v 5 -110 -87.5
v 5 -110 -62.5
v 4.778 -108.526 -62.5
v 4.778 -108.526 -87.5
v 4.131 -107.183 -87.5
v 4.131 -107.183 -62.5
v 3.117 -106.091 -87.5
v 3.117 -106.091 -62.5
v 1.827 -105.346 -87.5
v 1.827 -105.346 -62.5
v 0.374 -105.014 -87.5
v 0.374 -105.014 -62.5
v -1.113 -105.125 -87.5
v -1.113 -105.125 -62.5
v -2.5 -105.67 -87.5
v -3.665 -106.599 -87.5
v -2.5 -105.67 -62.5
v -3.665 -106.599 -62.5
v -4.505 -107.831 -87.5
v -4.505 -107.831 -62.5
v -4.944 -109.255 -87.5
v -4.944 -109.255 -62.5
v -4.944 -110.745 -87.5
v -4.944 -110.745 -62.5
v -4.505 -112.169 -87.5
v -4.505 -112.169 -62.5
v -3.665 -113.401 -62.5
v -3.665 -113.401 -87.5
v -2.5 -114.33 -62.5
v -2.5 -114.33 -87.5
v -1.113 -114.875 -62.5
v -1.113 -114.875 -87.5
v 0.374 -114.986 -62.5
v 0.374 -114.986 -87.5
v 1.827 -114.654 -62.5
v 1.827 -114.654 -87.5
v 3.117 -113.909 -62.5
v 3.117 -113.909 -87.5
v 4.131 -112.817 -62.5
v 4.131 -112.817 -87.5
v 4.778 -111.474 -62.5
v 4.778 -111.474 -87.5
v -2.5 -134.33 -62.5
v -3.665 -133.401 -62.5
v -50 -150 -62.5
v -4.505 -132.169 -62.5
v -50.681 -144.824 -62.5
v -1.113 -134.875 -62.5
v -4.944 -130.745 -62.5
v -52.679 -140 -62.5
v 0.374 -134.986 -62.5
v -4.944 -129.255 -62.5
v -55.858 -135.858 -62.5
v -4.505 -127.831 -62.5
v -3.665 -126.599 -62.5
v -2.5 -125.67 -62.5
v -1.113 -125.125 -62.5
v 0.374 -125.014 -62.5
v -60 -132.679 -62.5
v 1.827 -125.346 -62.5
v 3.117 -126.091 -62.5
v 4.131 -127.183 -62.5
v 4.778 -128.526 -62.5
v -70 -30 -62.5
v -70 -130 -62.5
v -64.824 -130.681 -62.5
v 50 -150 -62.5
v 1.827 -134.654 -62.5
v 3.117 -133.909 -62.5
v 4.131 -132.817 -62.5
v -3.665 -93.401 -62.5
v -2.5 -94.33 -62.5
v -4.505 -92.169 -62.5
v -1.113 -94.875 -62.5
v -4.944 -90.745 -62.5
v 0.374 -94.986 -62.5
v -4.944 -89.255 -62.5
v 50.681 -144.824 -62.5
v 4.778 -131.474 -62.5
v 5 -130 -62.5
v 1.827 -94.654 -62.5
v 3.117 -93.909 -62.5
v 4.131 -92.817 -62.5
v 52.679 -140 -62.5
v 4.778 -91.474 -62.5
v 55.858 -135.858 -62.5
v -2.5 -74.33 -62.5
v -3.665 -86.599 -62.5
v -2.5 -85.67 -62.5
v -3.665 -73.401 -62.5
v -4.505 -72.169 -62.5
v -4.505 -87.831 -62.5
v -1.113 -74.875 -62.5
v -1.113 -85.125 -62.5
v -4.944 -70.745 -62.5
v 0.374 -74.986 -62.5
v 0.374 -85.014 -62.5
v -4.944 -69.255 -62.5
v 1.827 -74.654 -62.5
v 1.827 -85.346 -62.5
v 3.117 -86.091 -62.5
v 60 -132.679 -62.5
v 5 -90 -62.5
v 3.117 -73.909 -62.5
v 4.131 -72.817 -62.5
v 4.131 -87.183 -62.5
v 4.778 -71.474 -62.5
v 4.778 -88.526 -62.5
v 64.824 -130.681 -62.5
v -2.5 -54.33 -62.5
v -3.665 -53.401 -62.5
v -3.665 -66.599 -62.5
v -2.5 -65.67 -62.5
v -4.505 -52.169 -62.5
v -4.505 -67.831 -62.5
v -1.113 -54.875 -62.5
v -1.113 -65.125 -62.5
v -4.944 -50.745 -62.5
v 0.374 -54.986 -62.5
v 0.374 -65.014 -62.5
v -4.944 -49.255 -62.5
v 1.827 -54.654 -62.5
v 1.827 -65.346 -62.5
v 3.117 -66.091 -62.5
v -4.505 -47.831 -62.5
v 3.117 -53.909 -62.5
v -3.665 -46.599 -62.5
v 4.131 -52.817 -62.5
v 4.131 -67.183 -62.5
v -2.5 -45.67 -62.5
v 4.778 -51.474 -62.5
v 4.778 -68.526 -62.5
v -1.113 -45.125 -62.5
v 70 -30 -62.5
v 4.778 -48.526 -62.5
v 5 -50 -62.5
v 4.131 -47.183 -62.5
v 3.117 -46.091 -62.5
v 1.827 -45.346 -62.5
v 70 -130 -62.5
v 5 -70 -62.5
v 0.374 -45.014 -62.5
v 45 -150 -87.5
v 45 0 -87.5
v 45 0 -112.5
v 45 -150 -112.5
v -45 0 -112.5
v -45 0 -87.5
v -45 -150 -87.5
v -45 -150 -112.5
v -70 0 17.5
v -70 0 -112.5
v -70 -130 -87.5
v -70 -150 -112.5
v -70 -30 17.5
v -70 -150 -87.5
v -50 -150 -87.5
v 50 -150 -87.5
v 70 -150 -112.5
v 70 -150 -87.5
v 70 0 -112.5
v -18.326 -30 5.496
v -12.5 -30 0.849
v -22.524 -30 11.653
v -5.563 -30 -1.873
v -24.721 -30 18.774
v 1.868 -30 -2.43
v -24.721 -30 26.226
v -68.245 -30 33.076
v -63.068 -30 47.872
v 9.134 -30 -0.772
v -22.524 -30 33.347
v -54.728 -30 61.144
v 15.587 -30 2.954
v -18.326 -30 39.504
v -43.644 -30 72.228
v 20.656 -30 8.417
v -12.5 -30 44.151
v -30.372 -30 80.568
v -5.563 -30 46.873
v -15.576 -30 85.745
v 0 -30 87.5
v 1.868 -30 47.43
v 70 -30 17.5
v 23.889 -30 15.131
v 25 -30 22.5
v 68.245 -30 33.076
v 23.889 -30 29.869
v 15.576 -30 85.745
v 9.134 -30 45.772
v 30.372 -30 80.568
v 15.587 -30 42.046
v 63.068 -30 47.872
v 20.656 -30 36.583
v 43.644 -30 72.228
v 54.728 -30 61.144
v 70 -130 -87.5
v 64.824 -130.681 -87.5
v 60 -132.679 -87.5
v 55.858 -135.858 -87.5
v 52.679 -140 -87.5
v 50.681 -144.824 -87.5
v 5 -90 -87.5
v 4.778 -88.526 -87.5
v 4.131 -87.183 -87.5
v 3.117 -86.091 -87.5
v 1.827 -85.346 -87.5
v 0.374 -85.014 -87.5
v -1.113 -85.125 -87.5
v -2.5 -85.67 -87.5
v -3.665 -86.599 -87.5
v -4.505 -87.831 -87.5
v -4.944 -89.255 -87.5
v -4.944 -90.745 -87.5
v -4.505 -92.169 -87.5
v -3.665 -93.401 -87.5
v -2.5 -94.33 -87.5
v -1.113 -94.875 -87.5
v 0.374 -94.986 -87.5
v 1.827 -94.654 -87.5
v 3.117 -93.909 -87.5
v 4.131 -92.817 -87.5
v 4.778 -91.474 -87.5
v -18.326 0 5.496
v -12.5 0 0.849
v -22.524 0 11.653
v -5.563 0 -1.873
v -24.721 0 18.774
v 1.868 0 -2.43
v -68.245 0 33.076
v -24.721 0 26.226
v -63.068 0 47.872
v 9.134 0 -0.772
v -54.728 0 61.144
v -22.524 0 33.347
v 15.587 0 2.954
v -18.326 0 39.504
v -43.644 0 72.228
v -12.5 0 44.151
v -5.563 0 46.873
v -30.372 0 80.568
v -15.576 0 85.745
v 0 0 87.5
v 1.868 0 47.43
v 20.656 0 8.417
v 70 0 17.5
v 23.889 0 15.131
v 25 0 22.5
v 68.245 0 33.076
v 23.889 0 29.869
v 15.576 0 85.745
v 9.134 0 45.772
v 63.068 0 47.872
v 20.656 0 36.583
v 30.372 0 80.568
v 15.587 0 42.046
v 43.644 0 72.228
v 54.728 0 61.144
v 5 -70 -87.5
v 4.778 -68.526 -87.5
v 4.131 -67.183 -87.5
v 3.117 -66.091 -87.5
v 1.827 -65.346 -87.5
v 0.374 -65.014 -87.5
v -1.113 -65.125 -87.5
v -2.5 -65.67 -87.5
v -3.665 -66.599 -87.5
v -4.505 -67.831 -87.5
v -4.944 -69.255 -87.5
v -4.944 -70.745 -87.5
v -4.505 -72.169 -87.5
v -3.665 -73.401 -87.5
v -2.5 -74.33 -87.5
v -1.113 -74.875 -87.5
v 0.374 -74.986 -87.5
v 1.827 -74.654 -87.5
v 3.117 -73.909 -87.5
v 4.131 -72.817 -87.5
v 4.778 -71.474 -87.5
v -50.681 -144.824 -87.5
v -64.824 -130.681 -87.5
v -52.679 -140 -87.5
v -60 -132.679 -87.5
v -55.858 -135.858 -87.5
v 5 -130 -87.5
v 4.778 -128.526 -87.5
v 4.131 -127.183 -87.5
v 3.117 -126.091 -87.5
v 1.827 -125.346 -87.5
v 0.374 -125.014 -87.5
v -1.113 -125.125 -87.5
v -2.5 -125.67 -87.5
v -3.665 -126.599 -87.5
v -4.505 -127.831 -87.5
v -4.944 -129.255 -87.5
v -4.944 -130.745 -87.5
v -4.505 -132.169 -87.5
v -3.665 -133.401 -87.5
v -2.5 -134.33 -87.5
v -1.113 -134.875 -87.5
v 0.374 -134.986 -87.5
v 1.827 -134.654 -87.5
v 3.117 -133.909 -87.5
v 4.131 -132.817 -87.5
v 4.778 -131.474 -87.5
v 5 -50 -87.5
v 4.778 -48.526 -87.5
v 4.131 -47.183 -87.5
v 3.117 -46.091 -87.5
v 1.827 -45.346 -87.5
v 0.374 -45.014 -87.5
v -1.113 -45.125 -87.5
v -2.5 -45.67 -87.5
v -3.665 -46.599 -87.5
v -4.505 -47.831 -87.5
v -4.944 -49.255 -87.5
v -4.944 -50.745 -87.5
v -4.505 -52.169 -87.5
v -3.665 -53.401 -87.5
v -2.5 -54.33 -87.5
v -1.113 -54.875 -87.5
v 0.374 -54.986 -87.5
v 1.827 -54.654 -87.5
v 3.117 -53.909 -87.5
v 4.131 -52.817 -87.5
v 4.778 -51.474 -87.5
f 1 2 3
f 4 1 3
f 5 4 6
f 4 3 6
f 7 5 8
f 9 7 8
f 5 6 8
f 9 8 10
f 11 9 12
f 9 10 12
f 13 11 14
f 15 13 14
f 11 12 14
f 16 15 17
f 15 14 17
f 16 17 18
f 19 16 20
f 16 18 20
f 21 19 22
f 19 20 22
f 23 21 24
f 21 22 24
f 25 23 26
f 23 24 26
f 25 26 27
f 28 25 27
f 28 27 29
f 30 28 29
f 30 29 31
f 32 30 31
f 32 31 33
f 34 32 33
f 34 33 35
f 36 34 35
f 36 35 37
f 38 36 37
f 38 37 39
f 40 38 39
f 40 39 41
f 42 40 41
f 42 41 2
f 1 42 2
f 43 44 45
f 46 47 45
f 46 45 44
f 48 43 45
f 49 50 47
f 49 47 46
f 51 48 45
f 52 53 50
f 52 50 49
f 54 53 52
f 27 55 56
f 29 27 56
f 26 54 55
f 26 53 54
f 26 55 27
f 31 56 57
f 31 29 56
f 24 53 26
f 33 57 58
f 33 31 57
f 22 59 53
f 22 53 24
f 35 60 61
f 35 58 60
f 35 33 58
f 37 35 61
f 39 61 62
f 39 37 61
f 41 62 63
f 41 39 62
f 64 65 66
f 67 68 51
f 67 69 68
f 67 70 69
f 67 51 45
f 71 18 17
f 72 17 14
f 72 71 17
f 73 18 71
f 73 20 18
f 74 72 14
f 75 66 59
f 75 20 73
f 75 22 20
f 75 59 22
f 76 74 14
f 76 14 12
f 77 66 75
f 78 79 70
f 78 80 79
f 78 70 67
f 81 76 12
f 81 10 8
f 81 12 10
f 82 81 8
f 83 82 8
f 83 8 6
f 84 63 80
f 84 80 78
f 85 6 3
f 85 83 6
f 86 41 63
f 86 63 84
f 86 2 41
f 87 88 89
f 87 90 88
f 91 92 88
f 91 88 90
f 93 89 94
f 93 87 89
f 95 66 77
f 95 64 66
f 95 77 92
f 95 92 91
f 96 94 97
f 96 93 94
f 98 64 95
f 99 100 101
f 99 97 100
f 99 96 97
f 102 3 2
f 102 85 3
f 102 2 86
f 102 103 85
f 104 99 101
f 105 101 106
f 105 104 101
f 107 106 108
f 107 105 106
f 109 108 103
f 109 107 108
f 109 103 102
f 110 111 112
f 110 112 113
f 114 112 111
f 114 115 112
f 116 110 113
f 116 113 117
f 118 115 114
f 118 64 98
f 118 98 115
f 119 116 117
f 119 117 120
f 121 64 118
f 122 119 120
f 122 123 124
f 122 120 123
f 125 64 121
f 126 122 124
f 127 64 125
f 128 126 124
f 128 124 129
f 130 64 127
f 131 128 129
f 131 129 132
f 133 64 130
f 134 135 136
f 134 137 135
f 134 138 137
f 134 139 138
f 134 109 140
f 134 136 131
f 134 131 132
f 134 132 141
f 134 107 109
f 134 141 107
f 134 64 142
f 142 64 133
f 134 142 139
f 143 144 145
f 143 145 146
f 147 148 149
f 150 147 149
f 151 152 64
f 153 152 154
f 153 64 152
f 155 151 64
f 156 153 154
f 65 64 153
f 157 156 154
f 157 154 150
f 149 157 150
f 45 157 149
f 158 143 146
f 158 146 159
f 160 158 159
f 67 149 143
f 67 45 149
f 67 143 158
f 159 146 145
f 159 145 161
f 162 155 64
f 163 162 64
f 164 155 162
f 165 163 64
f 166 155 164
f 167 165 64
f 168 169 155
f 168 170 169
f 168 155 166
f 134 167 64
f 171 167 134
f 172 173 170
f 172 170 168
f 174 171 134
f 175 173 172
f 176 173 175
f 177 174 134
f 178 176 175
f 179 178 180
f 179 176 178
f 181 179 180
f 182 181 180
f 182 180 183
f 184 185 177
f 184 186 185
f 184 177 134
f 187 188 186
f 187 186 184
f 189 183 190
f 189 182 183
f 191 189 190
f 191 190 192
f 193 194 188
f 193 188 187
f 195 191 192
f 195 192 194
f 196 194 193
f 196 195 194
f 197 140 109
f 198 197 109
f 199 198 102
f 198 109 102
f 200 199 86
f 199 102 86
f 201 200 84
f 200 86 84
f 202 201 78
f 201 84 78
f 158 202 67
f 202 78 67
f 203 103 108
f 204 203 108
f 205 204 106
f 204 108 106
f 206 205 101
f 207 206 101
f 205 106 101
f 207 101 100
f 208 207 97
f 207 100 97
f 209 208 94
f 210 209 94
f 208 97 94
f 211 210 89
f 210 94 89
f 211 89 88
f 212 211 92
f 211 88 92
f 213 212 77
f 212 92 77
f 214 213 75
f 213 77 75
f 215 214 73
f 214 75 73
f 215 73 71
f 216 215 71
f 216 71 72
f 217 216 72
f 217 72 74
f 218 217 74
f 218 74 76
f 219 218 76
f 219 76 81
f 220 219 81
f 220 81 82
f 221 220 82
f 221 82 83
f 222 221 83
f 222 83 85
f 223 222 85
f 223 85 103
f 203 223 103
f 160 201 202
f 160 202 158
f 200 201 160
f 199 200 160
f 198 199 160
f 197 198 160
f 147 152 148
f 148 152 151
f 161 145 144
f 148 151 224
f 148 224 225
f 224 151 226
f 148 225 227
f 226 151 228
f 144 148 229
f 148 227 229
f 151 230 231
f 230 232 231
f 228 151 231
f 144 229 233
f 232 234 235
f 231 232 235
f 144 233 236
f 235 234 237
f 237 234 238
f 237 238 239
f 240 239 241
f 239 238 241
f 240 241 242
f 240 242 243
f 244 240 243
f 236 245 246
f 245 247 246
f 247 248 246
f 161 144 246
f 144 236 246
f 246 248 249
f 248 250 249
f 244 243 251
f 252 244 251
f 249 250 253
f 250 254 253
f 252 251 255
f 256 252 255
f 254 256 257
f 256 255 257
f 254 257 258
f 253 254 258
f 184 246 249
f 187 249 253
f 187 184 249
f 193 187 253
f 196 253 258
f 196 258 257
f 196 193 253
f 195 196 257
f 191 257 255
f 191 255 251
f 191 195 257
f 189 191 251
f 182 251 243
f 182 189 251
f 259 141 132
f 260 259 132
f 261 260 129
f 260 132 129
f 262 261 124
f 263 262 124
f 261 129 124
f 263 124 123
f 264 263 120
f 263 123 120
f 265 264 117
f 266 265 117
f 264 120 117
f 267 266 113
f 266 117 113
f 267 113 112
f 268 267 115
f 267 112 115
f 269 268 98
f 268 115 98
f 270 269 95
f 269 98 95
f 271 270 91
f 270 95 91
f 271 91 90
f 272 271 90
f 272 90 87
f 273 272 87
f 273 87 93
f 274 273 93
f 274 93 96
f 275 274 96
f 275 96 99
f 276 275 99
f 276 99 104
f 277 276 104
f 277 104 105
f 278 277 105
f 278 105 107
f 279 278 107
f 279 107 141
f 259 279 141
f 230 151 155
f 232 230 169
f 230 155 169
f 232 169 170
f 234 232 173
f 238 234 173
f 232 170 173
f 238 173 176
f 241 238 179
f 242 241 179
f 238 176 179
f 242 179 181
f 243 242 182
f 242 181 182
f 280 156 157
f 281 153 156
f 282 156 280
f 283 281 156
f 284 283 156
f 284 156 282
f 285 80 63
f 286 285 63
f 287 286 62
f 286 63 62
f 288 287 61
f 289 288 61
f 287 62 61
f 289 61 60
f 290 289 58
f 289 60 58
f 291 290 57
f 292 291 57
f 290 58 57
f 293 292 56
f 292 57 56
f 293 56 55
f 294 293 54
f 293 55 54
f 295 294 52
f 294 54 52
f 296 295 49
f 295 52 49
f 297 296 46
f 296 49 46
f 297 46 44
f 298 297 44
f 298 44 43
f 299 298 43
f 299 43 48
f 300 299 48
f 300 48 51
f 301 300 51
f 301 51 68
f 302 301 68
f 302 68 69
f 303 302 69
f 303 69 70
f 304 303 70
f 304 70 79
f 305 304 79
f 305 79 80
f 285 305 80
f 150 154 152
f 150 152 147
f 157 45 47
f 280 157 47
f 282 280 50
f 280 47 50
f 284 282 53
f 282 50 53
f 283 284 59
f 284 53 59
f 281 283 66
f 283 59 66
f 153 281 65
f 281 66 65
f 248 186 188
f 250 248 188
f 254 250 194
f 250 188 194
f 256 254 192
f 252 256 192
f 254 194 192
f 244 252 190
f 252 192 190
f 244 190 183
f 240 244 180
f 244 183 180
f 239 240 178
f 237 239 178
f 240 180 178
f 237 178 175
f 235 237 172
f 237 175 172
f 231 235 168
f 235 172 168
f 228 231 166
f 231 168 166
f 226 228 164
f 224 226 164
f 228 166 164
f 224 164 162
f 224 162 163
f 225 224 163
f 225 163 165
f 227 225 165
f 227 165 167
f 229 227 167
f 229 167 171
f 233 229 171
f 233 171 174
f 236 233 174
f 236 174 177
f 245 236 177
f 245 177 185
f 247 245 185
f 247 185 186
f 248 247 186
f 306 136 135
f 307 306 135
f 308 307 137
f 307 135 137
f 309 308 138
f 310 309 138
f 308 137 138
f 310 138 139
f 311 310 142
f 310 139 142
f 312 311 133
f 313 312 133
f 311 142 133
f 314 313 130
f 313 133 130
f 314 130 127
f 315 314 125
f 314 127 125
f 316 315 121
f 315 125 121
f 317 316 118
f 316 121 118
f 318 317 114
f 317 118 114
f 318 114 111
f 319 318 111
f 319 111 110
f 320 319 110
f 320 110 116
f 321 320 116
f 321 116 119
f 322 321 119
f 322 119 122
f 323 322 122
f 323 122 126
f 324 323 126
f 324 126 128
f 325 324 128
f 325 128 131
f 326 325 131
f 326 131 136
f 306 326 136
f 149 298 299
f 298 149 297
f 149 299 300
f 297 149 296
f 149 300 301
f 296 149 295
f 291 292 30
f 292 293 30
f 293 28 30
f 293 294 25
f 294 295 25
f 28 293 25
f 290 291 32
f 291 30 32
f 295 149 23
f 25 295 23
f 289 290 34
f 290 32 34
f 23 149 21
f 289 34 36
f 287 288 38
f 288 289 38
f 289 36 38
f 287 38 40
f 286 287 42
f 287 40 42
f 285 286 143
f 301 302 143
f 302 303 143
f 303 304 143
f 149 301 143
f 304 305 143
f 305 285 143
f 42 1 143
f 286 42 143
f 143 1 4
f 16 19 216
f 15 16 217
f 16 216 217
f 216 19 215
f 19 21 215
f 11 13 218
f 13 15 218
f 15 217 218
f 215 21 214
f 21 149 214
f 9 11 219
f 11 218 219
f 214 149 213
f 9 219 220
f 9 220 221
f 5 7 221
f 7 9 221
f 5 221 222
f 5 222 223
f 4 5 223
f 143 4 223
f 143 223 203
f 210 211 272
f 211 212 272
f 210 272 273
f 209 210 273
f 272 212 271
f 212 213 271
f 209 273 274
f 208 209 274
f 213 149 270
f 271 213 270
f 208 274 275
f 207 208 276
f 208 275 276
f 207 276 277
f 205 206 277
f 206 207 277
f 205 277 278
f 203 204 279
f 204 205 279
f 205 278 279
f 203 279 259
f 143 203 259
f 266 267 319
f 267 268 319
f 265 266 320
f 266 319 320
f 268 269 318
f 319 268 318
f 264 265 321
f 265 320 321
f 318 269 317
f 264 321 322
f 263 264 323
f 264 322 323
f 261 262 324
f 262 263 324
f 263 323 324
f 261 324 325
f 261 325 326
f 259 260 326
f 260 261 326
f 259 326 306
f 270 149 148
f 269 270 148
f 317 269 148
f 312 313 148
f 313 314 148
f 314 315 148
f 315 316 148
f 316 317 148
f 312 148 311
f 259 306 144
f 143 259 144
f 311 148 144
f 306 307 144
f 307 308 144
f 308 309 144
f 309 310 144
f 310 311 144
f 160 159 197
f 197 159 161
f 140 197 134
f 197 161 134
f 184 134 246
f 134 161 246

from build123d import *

# Parameters (mm, degrees)
F0_W      = 140
F0_H      = 175
F1_DEPTH  = 30
F2_R      = 69.99999
F3_R      = 25
F4_DEPTH  = 30.001
F5_W      = 140
F5_H      = 25
F6_DEPTH  = 120
F7_W      = 25
F7_H      = 150
F8_DEPTH  = 25
F9_R      = 20
F10_DEPTH = 25
F11_R     = 5
F12_DEPTH = 50.001


# Not quite as in the source:
# - a fillet or chamfer is up to 0.001 mm smaller than in the source, because OpenCascade refuses the exact size


with BuildPart() as f1:
    # F0 (on Front) → F1 (new body)
    with BuildSketch(Plane.XZ):
        Rectangle(F0_W, F0_H)
    extrude(amount=F1_DEPTH)

    # F2 (radius 70 in the source; OpenCascade refuses exactly that, so slightly less here)
    f2_edges = [f1.edges().sort_by_distance(p)[0] for p in [
        (70, -15, 87.5),
        (-70, -15, 87.5),
    ]]
    fillet(f2_edges, radius=F2_R)

    # F3 (on face) → F4 (cut, through all)
    with BuildSketch(Plane.XZ.offset(30)):
        with Locations((0, 22.5)):
            Circle(F3_R)
    extrude(amount=-F4_DEPTH, mode=Mode.SUBTRACT)

    # F5 (on face) → F6 (join)
    with BuildSketch(Plane.XZ.offset(30)):
        with Locations((0, -75)):
            Rectangle(F5_W, F5_H)
    extrude(amount=F6_DEPTH)

    # F7 (on face) → F8 (join)
    with BuildSketch(Plane(origin=(0, 0, -87.5), x_dir=(1, 0, 0), z_dir=(0, 0, -1))):
        with Locations((-57.5, 75)):
            Rectangle(F7_W, F7_H)
        with Locations((57.5, 75)):
            Rectangle(F7_W, F7_H)
    extrude(amount=F8_DEPTH)

    # F9 (on face) → F10 (cut)
    with BuildSketch(Plane.XY.offset(-62.5)):
        with Locations((-70, -150)):
            Circle(F9_R)
        with Locations((70, -150)):
            Circle(F9_R)
    extrude(amount=-F10_DEPTH, mode=Mode.SUBTRACT)

    # F11 (on face) → F12 (cut, through all)
    with BuildSketch(Plane.XY.offset(-62.5)):
        with Locations((0, -130)):
            Circle(F11_R)
        with Locations((0, -110)):
            Circle(F11_R)
        with Locations((0, -90)):
            Circle(F11_R)
        with Locations((0, -70)):
            Circle(F11_R)
        with Locations((0, -50)):
            Circle(F11_R)
    extrude(amount=-F12_DEPTH, mode=Mode.SUBTRACT)


solid = f1.part
